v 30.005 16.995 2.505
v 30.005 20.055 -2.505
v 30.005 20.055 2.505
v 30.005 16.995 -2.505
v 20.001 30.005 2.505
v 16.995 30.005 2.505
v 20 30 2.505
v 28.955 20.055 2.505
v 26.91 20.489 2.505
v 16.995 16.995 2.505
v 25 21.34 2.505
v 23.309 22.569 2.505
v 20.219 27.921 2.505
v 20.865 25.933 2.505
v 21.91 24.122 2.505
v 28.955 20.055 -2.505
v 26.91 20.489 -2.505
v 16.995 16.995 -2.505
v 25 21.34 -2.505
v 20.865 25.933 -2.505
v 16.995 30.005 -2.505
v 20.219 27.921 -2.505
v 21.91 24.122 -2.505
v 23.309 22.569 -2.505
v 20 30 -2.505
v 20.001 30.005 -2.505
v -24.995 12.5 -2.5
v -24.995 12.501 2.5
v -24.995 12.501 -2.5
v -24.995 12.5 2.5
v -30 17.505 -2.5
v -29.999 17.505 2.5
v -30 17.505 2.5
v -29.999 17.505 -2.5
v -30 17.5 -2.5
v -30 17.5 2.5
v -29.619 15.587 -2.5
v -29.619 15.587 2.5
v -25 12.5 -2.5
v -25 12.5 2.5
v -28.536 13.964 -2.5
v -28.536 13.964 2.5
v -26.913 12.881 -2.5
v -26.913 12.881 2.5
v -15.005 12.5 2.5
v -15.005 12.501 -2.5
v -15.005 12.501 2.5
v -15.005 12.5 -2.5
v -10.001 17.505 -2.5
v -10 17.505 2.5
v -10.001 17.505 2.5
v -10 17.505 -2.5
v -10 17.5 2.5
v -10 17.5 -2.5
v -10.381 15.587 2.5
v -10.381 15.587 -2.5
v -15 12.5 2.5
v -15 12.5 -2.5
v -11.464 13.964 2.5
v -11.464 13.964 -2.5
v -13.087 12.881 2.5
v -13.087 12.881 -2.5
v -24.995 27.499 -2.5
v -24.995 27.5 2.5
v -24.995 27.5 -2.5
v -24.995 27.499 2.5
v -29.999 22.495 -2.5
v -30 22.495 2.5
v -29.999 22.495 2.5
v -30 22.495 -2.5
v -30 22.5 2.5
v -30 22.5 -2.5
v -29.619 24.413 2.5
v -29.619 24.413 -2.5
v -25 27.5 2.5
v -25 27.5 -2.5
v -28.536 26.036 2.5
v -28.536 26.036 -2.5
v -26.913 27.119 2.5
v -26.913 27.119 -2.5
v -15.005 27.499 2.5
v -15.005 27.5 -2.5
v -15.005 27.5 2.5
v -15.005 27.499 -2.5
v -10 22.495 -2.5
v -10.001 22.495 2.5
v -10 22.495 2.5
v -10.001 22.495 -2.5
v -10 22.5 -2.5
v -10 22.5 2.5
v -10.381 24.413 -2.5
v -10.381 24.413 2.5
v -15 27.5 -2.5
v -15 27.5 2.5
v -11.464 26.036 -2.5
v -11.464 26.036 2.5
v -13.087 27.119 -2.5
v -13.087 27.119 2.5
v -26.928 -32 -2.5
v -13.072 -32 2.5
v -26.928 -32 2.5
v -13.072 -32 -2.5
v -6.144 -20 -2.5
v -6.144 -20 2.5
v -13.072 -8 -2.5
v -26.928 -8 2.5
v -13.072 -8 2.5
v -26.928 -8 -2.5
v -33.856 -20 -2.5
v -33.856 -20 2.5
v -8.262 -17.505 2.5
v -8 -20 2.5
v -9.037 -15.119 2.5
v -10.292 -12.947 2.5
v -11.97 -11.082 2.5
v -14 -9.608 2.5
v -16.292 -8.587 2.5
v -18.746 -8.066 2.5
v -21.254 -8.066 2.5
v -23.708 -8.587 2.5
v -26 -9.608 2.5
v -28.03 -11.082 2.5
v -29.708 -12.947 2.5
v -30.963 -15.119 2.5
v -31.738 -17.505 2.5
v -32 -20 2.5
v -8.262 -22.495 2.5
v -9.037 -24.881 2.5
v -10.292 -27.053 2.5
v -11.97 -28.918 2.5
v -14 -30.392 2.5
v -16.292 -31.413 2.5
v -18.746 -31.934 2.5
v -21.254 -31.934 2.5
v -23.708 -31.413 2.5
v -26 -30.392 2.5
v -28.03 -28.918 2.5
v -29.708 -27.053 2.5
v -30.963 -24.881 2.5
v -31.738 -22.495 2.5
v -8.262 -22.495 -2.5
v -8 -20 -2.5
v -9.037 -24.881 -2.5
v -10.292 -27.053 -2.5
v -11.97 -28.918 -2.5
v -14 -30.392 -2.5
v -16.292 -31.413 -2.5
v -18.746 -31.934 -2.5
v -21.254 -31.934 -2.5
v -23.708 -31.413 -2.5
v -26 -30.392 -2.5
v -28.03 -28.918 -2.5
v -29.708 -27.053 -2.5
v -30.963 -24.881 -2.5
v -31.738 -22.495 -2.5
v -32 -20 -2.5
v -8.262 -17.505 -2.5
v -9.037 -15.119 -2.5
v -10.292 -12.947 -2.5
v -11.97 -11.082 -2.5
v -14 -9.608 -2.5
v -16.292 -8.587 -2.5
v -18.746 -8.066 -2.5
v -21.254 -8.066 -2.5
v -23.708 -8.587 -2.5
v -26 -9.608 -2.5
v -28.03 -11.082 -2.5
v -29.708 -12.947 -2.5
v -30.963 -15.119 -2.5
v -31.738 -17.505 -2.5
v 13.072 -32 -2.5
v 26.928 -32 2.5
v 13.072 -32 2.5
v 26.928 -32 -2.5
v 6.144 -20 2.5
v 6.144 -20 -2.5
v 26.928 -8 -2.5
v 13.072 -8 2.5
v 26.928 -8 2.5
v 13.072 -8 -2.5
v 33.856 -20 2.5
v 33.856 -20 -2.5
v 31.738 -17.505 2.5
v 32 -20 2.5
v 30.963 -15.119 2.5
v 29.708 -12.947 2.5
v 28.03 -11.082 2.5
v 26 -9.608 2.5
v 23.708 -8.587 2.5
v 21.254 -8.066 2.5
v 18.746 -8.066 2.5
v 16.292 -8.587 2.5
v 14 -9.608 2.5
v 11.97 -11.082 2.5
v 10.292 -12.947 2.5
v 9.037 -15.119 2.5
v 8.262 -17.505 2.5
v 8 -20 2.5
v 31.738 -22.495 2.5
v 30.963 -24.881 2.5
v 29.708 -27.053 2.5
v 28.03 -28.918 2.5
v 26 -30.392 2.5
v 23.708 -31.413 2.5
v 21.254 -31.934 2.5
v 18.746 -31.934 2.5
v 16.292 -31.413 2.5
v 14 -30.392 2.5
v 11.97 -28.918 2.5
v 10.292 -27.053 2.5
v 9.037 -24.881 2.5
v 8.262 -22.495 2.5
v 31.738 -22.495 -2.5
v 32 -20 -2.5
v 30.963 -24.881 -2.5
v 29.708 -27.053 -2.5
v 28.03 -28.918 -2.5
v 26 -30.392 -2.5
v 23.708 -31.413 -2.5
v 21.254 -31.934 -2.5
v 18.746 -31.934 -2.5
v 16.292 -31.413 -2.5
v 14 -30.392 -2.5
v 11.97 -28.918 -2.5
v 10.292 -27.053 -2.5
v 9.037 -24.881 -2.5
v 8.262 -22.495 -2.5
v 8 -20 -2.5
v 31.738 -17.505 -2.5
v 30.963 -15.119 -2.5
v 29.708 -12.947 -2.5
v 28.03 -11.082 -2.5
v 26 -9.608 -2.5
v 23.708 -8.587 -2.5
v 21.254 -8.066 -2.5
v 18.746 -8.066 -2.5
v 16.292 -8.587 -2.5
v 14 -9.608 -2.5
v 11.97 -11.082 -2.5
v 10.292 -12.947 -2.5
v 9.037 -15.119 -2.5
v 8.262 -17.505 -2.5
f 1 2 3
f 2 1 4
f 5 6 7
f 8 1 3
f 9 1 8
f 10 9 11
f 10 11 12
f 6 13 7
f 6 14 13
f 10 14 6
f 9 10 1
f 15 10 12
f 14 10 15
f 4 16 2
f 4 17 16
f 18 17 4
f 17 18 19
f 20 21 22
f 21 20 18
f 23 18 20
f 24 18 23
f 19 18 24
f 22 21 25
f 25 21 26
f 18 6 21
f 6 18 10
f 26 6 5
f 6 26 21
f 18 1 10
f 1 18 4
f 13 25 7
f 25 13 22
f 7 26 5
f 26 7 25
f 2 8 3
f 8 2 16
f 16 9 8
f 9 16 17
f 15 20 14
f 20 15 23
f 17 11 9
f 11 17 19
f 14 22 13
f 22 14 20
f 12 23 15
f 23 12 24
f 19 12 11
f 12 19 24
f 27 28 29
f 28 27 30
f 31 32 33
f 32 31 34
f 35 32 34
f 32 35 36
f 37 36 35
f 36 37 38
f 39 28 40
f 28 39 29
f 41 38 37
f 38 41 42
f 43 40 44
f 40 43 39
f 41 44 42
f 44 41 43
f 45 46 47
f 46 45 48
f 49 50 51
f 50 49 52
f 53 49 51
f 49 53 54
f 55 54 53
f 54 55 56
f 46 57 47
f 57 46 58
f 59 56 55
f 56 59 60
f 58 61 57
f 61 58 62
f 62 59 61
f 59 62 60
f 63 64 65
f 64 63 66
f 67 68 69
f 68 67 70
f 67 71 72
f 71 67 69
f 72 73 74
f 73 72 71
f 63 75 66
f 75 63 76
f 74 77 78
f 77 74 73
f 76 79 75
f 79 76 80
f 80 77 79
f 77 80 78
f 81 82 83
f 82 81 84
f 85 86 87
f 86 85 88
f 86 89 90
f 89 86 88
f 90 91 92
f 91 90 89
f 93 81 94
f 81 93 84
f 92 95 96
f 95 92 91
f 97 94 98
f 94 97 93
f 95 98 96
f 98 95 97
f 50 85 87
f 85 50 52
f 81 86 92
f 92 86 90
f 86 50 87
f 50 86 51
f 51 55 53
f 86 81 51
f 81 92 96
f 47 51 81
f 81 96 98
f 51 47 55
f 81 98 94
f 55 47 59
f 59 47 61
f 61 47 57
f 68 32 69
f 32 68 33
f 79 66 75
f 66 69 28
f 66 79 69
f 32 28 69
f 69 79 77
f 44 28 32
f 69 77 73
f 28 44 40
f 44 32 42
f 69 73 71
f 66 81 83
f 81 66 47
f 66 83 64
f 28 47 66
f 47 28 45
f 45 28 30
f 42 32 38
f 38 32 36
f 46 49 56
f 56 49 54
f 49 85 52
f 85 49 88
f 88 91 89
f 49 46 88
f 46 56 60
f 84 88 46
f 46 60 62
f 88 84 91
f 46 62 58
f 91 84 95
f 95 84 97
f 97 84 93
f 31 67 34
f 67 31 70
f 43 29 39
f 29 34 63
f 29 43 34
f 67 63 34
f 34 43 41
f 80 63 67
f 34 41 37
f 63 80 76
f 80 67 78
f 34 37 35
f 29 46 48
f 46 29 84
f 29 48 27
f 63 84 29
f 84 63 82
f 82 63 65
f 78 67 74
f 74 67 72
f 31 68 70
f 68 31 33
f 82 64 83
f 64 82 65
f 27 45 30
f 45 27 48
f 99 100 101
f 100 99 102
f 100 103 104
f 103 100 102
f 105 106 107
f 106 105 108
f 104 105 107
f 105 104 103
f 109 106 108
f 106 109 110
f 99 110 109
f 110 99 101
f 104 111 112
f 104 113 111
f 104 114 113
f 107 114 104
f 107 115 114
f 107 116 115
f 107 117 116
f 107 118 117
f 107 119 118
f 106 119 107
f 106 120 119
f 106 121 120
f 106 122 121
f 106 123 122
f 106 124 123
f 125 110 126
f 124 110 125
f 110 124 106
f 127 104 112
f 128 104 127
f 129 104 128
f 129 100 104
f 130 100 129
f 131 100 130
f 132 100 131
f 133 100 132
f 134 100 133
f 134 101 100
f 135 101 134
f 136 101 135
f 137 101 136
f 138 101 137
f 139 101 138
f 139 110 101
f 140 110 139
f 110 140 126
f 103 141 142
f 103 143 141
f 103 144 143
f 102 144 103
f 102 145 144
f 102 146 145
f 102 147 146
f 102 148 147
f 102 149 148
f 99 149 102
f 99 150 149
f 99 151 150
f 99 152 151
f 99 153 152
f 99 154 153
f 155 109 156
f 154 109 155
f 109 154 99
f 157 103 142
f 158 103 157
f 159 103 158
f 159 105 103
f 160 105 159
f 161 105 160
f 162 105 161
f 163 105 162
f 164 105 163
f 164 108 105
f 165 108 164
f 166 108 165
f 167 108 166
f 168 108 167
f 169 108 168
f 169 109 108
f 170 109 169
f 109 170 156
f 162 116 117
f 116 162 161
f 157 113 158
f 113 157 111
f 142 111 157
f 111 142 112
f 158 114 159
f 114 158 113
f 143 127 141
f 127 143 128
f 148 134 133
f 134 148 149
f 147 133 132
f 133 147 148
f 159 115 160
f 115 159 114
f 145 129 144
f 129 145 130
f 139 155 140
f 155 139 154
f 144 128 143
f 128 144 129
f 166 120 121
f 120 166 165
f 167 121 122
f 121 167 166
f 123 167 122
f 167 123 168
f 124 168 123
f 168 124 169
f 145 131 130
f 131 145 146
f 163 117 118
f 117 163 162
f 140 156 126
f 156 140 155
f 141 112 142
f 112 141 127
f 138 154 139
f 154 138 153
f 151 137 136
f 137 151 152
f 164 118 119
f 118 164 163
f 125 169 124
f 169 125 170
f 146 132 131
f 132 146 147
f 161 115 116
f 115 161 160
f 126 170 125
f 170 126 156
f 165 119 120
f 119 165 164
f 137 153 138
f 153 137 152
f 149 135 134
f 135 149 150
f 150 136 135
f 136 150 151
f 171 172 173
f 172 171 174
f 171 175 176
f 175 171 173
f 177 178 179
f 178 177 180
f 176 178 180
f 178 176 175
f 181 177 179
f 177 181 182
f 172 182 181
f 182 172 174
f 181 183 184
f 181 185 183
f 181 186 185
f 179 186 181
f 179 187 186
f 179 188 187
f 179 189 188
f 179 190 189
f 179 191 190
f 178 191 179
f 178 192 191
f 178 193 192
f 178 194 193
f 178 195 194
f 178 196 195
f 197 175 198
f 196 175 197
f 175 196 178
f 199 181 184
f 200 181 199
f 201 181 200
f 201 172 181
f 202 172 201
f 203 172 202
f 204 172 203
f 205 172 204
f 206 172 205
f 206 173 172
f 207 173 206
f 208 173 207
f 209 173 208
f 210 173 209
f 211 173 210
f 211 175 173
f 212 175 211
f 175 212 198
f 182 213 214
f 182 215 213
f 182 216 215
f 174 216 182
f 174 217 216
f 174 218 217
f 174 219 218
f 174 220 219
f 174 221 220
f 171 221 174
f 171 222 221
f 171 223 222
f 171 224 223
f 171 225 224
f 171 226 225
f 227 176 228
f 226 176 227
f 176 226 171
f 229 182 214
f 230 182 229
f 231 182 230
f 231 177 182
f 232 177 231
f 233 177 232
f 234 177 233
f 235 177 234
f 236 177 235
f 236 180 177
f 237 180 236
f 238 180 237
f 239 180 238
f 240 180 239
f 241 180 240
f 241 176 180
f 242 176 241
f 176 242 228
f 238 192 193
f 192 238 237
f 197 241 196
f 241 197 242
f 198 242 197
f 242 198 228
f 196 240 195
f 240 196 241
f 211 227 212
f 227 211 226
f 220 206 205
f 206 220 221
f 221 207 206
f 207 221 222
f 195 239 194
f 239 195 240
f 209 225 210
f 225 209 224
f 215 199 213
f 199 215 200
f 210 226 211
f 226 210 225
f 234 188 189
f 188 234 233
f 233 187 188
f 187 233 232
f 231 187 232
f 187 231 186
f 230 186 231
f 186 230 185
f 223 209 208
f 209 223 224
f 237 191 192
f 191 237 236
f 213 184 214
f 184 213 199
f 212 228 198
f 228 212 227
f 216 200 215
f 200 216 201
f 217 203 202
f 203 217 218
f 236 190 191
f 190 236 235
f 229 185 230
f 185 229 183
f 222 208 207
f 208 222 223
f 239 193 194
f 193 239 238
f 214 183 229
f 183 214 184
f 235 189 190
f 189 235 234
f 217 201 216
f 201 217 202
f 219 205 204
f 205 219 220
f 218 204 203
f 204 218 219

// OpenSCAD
// Some random colors
module plastic()   { color([  1,  .7,   0]) children(); }
module gray()      { color([ .4,  .4,  .4]) children(); }
module black()     { color([ .3,  .3,  .3]) children(); }
module orange()    { color([  1,  .7,   0]) children(); }
module yellow()    { color([ .7,  .7,  .3]) children(); }
module green_pcb() { color([ .0,  .5, .25]) children(); }
module metal()     { color([ .7,  .7,  .7]) children(); }
module gold()      { color([ .8,  .5,  .0]) children(); }
module stainless() { color([.45, .43,  .5]) children(); }
module steel()     { color([.65, .67, .72]) children(); }
module iron()      { color([.36, .33, .33]) children(); }

// Same as mirror() but duplicates the children as opposed to just moving them.
module mirrored(v) {
  union() {
    children();
    mirror(v = v)
      children();
  } 
}

// Build a negative rounded corner to soften a square angle. Extra adds more
// material behind the rounded corner, which is sometimes useful to remove
// stuff.
module rounded_edge(radius, height, extra = 0) {
  translate([radius / 2, radius / 2, 0])
    difference() {
      translate([-extra/2, -extra/2, 0])
      cube([radius + .01 + extra, radius + .01 + extra, height + .01], center = true);
      translate([radius / 2, radius /2, 0])
        cylinder(r = radius, h = height + .02, center = true);
    }
}

// Build a cube with the corners in the z plane softened.
module rounded_cube(v, radius) {
  difference() {
    cube(v, center=true);
    mirrored([0, 1, 0]) mirrored([1, 0, 0])
      translate([-v[0]/2,-v[1]/2,0])
        rounded_edge(radius, v[2]);
  }
}

function number_of_circle_fragments(r) =
  $fn>0 ? ($fn >= 3 ? $fn : 3)
        : ceil(max(min(360 / $fa,
                       r * 2 * PI / $fs),
                   5));

// Build a cylinder garanteed to fit and element of the given radius. Aka, a
// little bit larger than a regular cylinder. Very useful with small fn.
module cylinder_outer(height,radius) {
  fn = number_of_circle_fragments(radius);
  fudge = 1 / cos(180 / fn);
  cylinder(h = height, r = radius * fudge, center = true);
}

// examples
translate([20, 20, 0]) rounded_edge(10, 5, 3);
translate([-20, 20, 0]) rounded_cube([20,15,5], 5);
mirrored([1, 0, 0]) translate([-20, -20, 0])difference() {
  cylinder_outer(5, 12, $fn = 6);
  cylinder(h = 6, r = 12, center = true);
}
